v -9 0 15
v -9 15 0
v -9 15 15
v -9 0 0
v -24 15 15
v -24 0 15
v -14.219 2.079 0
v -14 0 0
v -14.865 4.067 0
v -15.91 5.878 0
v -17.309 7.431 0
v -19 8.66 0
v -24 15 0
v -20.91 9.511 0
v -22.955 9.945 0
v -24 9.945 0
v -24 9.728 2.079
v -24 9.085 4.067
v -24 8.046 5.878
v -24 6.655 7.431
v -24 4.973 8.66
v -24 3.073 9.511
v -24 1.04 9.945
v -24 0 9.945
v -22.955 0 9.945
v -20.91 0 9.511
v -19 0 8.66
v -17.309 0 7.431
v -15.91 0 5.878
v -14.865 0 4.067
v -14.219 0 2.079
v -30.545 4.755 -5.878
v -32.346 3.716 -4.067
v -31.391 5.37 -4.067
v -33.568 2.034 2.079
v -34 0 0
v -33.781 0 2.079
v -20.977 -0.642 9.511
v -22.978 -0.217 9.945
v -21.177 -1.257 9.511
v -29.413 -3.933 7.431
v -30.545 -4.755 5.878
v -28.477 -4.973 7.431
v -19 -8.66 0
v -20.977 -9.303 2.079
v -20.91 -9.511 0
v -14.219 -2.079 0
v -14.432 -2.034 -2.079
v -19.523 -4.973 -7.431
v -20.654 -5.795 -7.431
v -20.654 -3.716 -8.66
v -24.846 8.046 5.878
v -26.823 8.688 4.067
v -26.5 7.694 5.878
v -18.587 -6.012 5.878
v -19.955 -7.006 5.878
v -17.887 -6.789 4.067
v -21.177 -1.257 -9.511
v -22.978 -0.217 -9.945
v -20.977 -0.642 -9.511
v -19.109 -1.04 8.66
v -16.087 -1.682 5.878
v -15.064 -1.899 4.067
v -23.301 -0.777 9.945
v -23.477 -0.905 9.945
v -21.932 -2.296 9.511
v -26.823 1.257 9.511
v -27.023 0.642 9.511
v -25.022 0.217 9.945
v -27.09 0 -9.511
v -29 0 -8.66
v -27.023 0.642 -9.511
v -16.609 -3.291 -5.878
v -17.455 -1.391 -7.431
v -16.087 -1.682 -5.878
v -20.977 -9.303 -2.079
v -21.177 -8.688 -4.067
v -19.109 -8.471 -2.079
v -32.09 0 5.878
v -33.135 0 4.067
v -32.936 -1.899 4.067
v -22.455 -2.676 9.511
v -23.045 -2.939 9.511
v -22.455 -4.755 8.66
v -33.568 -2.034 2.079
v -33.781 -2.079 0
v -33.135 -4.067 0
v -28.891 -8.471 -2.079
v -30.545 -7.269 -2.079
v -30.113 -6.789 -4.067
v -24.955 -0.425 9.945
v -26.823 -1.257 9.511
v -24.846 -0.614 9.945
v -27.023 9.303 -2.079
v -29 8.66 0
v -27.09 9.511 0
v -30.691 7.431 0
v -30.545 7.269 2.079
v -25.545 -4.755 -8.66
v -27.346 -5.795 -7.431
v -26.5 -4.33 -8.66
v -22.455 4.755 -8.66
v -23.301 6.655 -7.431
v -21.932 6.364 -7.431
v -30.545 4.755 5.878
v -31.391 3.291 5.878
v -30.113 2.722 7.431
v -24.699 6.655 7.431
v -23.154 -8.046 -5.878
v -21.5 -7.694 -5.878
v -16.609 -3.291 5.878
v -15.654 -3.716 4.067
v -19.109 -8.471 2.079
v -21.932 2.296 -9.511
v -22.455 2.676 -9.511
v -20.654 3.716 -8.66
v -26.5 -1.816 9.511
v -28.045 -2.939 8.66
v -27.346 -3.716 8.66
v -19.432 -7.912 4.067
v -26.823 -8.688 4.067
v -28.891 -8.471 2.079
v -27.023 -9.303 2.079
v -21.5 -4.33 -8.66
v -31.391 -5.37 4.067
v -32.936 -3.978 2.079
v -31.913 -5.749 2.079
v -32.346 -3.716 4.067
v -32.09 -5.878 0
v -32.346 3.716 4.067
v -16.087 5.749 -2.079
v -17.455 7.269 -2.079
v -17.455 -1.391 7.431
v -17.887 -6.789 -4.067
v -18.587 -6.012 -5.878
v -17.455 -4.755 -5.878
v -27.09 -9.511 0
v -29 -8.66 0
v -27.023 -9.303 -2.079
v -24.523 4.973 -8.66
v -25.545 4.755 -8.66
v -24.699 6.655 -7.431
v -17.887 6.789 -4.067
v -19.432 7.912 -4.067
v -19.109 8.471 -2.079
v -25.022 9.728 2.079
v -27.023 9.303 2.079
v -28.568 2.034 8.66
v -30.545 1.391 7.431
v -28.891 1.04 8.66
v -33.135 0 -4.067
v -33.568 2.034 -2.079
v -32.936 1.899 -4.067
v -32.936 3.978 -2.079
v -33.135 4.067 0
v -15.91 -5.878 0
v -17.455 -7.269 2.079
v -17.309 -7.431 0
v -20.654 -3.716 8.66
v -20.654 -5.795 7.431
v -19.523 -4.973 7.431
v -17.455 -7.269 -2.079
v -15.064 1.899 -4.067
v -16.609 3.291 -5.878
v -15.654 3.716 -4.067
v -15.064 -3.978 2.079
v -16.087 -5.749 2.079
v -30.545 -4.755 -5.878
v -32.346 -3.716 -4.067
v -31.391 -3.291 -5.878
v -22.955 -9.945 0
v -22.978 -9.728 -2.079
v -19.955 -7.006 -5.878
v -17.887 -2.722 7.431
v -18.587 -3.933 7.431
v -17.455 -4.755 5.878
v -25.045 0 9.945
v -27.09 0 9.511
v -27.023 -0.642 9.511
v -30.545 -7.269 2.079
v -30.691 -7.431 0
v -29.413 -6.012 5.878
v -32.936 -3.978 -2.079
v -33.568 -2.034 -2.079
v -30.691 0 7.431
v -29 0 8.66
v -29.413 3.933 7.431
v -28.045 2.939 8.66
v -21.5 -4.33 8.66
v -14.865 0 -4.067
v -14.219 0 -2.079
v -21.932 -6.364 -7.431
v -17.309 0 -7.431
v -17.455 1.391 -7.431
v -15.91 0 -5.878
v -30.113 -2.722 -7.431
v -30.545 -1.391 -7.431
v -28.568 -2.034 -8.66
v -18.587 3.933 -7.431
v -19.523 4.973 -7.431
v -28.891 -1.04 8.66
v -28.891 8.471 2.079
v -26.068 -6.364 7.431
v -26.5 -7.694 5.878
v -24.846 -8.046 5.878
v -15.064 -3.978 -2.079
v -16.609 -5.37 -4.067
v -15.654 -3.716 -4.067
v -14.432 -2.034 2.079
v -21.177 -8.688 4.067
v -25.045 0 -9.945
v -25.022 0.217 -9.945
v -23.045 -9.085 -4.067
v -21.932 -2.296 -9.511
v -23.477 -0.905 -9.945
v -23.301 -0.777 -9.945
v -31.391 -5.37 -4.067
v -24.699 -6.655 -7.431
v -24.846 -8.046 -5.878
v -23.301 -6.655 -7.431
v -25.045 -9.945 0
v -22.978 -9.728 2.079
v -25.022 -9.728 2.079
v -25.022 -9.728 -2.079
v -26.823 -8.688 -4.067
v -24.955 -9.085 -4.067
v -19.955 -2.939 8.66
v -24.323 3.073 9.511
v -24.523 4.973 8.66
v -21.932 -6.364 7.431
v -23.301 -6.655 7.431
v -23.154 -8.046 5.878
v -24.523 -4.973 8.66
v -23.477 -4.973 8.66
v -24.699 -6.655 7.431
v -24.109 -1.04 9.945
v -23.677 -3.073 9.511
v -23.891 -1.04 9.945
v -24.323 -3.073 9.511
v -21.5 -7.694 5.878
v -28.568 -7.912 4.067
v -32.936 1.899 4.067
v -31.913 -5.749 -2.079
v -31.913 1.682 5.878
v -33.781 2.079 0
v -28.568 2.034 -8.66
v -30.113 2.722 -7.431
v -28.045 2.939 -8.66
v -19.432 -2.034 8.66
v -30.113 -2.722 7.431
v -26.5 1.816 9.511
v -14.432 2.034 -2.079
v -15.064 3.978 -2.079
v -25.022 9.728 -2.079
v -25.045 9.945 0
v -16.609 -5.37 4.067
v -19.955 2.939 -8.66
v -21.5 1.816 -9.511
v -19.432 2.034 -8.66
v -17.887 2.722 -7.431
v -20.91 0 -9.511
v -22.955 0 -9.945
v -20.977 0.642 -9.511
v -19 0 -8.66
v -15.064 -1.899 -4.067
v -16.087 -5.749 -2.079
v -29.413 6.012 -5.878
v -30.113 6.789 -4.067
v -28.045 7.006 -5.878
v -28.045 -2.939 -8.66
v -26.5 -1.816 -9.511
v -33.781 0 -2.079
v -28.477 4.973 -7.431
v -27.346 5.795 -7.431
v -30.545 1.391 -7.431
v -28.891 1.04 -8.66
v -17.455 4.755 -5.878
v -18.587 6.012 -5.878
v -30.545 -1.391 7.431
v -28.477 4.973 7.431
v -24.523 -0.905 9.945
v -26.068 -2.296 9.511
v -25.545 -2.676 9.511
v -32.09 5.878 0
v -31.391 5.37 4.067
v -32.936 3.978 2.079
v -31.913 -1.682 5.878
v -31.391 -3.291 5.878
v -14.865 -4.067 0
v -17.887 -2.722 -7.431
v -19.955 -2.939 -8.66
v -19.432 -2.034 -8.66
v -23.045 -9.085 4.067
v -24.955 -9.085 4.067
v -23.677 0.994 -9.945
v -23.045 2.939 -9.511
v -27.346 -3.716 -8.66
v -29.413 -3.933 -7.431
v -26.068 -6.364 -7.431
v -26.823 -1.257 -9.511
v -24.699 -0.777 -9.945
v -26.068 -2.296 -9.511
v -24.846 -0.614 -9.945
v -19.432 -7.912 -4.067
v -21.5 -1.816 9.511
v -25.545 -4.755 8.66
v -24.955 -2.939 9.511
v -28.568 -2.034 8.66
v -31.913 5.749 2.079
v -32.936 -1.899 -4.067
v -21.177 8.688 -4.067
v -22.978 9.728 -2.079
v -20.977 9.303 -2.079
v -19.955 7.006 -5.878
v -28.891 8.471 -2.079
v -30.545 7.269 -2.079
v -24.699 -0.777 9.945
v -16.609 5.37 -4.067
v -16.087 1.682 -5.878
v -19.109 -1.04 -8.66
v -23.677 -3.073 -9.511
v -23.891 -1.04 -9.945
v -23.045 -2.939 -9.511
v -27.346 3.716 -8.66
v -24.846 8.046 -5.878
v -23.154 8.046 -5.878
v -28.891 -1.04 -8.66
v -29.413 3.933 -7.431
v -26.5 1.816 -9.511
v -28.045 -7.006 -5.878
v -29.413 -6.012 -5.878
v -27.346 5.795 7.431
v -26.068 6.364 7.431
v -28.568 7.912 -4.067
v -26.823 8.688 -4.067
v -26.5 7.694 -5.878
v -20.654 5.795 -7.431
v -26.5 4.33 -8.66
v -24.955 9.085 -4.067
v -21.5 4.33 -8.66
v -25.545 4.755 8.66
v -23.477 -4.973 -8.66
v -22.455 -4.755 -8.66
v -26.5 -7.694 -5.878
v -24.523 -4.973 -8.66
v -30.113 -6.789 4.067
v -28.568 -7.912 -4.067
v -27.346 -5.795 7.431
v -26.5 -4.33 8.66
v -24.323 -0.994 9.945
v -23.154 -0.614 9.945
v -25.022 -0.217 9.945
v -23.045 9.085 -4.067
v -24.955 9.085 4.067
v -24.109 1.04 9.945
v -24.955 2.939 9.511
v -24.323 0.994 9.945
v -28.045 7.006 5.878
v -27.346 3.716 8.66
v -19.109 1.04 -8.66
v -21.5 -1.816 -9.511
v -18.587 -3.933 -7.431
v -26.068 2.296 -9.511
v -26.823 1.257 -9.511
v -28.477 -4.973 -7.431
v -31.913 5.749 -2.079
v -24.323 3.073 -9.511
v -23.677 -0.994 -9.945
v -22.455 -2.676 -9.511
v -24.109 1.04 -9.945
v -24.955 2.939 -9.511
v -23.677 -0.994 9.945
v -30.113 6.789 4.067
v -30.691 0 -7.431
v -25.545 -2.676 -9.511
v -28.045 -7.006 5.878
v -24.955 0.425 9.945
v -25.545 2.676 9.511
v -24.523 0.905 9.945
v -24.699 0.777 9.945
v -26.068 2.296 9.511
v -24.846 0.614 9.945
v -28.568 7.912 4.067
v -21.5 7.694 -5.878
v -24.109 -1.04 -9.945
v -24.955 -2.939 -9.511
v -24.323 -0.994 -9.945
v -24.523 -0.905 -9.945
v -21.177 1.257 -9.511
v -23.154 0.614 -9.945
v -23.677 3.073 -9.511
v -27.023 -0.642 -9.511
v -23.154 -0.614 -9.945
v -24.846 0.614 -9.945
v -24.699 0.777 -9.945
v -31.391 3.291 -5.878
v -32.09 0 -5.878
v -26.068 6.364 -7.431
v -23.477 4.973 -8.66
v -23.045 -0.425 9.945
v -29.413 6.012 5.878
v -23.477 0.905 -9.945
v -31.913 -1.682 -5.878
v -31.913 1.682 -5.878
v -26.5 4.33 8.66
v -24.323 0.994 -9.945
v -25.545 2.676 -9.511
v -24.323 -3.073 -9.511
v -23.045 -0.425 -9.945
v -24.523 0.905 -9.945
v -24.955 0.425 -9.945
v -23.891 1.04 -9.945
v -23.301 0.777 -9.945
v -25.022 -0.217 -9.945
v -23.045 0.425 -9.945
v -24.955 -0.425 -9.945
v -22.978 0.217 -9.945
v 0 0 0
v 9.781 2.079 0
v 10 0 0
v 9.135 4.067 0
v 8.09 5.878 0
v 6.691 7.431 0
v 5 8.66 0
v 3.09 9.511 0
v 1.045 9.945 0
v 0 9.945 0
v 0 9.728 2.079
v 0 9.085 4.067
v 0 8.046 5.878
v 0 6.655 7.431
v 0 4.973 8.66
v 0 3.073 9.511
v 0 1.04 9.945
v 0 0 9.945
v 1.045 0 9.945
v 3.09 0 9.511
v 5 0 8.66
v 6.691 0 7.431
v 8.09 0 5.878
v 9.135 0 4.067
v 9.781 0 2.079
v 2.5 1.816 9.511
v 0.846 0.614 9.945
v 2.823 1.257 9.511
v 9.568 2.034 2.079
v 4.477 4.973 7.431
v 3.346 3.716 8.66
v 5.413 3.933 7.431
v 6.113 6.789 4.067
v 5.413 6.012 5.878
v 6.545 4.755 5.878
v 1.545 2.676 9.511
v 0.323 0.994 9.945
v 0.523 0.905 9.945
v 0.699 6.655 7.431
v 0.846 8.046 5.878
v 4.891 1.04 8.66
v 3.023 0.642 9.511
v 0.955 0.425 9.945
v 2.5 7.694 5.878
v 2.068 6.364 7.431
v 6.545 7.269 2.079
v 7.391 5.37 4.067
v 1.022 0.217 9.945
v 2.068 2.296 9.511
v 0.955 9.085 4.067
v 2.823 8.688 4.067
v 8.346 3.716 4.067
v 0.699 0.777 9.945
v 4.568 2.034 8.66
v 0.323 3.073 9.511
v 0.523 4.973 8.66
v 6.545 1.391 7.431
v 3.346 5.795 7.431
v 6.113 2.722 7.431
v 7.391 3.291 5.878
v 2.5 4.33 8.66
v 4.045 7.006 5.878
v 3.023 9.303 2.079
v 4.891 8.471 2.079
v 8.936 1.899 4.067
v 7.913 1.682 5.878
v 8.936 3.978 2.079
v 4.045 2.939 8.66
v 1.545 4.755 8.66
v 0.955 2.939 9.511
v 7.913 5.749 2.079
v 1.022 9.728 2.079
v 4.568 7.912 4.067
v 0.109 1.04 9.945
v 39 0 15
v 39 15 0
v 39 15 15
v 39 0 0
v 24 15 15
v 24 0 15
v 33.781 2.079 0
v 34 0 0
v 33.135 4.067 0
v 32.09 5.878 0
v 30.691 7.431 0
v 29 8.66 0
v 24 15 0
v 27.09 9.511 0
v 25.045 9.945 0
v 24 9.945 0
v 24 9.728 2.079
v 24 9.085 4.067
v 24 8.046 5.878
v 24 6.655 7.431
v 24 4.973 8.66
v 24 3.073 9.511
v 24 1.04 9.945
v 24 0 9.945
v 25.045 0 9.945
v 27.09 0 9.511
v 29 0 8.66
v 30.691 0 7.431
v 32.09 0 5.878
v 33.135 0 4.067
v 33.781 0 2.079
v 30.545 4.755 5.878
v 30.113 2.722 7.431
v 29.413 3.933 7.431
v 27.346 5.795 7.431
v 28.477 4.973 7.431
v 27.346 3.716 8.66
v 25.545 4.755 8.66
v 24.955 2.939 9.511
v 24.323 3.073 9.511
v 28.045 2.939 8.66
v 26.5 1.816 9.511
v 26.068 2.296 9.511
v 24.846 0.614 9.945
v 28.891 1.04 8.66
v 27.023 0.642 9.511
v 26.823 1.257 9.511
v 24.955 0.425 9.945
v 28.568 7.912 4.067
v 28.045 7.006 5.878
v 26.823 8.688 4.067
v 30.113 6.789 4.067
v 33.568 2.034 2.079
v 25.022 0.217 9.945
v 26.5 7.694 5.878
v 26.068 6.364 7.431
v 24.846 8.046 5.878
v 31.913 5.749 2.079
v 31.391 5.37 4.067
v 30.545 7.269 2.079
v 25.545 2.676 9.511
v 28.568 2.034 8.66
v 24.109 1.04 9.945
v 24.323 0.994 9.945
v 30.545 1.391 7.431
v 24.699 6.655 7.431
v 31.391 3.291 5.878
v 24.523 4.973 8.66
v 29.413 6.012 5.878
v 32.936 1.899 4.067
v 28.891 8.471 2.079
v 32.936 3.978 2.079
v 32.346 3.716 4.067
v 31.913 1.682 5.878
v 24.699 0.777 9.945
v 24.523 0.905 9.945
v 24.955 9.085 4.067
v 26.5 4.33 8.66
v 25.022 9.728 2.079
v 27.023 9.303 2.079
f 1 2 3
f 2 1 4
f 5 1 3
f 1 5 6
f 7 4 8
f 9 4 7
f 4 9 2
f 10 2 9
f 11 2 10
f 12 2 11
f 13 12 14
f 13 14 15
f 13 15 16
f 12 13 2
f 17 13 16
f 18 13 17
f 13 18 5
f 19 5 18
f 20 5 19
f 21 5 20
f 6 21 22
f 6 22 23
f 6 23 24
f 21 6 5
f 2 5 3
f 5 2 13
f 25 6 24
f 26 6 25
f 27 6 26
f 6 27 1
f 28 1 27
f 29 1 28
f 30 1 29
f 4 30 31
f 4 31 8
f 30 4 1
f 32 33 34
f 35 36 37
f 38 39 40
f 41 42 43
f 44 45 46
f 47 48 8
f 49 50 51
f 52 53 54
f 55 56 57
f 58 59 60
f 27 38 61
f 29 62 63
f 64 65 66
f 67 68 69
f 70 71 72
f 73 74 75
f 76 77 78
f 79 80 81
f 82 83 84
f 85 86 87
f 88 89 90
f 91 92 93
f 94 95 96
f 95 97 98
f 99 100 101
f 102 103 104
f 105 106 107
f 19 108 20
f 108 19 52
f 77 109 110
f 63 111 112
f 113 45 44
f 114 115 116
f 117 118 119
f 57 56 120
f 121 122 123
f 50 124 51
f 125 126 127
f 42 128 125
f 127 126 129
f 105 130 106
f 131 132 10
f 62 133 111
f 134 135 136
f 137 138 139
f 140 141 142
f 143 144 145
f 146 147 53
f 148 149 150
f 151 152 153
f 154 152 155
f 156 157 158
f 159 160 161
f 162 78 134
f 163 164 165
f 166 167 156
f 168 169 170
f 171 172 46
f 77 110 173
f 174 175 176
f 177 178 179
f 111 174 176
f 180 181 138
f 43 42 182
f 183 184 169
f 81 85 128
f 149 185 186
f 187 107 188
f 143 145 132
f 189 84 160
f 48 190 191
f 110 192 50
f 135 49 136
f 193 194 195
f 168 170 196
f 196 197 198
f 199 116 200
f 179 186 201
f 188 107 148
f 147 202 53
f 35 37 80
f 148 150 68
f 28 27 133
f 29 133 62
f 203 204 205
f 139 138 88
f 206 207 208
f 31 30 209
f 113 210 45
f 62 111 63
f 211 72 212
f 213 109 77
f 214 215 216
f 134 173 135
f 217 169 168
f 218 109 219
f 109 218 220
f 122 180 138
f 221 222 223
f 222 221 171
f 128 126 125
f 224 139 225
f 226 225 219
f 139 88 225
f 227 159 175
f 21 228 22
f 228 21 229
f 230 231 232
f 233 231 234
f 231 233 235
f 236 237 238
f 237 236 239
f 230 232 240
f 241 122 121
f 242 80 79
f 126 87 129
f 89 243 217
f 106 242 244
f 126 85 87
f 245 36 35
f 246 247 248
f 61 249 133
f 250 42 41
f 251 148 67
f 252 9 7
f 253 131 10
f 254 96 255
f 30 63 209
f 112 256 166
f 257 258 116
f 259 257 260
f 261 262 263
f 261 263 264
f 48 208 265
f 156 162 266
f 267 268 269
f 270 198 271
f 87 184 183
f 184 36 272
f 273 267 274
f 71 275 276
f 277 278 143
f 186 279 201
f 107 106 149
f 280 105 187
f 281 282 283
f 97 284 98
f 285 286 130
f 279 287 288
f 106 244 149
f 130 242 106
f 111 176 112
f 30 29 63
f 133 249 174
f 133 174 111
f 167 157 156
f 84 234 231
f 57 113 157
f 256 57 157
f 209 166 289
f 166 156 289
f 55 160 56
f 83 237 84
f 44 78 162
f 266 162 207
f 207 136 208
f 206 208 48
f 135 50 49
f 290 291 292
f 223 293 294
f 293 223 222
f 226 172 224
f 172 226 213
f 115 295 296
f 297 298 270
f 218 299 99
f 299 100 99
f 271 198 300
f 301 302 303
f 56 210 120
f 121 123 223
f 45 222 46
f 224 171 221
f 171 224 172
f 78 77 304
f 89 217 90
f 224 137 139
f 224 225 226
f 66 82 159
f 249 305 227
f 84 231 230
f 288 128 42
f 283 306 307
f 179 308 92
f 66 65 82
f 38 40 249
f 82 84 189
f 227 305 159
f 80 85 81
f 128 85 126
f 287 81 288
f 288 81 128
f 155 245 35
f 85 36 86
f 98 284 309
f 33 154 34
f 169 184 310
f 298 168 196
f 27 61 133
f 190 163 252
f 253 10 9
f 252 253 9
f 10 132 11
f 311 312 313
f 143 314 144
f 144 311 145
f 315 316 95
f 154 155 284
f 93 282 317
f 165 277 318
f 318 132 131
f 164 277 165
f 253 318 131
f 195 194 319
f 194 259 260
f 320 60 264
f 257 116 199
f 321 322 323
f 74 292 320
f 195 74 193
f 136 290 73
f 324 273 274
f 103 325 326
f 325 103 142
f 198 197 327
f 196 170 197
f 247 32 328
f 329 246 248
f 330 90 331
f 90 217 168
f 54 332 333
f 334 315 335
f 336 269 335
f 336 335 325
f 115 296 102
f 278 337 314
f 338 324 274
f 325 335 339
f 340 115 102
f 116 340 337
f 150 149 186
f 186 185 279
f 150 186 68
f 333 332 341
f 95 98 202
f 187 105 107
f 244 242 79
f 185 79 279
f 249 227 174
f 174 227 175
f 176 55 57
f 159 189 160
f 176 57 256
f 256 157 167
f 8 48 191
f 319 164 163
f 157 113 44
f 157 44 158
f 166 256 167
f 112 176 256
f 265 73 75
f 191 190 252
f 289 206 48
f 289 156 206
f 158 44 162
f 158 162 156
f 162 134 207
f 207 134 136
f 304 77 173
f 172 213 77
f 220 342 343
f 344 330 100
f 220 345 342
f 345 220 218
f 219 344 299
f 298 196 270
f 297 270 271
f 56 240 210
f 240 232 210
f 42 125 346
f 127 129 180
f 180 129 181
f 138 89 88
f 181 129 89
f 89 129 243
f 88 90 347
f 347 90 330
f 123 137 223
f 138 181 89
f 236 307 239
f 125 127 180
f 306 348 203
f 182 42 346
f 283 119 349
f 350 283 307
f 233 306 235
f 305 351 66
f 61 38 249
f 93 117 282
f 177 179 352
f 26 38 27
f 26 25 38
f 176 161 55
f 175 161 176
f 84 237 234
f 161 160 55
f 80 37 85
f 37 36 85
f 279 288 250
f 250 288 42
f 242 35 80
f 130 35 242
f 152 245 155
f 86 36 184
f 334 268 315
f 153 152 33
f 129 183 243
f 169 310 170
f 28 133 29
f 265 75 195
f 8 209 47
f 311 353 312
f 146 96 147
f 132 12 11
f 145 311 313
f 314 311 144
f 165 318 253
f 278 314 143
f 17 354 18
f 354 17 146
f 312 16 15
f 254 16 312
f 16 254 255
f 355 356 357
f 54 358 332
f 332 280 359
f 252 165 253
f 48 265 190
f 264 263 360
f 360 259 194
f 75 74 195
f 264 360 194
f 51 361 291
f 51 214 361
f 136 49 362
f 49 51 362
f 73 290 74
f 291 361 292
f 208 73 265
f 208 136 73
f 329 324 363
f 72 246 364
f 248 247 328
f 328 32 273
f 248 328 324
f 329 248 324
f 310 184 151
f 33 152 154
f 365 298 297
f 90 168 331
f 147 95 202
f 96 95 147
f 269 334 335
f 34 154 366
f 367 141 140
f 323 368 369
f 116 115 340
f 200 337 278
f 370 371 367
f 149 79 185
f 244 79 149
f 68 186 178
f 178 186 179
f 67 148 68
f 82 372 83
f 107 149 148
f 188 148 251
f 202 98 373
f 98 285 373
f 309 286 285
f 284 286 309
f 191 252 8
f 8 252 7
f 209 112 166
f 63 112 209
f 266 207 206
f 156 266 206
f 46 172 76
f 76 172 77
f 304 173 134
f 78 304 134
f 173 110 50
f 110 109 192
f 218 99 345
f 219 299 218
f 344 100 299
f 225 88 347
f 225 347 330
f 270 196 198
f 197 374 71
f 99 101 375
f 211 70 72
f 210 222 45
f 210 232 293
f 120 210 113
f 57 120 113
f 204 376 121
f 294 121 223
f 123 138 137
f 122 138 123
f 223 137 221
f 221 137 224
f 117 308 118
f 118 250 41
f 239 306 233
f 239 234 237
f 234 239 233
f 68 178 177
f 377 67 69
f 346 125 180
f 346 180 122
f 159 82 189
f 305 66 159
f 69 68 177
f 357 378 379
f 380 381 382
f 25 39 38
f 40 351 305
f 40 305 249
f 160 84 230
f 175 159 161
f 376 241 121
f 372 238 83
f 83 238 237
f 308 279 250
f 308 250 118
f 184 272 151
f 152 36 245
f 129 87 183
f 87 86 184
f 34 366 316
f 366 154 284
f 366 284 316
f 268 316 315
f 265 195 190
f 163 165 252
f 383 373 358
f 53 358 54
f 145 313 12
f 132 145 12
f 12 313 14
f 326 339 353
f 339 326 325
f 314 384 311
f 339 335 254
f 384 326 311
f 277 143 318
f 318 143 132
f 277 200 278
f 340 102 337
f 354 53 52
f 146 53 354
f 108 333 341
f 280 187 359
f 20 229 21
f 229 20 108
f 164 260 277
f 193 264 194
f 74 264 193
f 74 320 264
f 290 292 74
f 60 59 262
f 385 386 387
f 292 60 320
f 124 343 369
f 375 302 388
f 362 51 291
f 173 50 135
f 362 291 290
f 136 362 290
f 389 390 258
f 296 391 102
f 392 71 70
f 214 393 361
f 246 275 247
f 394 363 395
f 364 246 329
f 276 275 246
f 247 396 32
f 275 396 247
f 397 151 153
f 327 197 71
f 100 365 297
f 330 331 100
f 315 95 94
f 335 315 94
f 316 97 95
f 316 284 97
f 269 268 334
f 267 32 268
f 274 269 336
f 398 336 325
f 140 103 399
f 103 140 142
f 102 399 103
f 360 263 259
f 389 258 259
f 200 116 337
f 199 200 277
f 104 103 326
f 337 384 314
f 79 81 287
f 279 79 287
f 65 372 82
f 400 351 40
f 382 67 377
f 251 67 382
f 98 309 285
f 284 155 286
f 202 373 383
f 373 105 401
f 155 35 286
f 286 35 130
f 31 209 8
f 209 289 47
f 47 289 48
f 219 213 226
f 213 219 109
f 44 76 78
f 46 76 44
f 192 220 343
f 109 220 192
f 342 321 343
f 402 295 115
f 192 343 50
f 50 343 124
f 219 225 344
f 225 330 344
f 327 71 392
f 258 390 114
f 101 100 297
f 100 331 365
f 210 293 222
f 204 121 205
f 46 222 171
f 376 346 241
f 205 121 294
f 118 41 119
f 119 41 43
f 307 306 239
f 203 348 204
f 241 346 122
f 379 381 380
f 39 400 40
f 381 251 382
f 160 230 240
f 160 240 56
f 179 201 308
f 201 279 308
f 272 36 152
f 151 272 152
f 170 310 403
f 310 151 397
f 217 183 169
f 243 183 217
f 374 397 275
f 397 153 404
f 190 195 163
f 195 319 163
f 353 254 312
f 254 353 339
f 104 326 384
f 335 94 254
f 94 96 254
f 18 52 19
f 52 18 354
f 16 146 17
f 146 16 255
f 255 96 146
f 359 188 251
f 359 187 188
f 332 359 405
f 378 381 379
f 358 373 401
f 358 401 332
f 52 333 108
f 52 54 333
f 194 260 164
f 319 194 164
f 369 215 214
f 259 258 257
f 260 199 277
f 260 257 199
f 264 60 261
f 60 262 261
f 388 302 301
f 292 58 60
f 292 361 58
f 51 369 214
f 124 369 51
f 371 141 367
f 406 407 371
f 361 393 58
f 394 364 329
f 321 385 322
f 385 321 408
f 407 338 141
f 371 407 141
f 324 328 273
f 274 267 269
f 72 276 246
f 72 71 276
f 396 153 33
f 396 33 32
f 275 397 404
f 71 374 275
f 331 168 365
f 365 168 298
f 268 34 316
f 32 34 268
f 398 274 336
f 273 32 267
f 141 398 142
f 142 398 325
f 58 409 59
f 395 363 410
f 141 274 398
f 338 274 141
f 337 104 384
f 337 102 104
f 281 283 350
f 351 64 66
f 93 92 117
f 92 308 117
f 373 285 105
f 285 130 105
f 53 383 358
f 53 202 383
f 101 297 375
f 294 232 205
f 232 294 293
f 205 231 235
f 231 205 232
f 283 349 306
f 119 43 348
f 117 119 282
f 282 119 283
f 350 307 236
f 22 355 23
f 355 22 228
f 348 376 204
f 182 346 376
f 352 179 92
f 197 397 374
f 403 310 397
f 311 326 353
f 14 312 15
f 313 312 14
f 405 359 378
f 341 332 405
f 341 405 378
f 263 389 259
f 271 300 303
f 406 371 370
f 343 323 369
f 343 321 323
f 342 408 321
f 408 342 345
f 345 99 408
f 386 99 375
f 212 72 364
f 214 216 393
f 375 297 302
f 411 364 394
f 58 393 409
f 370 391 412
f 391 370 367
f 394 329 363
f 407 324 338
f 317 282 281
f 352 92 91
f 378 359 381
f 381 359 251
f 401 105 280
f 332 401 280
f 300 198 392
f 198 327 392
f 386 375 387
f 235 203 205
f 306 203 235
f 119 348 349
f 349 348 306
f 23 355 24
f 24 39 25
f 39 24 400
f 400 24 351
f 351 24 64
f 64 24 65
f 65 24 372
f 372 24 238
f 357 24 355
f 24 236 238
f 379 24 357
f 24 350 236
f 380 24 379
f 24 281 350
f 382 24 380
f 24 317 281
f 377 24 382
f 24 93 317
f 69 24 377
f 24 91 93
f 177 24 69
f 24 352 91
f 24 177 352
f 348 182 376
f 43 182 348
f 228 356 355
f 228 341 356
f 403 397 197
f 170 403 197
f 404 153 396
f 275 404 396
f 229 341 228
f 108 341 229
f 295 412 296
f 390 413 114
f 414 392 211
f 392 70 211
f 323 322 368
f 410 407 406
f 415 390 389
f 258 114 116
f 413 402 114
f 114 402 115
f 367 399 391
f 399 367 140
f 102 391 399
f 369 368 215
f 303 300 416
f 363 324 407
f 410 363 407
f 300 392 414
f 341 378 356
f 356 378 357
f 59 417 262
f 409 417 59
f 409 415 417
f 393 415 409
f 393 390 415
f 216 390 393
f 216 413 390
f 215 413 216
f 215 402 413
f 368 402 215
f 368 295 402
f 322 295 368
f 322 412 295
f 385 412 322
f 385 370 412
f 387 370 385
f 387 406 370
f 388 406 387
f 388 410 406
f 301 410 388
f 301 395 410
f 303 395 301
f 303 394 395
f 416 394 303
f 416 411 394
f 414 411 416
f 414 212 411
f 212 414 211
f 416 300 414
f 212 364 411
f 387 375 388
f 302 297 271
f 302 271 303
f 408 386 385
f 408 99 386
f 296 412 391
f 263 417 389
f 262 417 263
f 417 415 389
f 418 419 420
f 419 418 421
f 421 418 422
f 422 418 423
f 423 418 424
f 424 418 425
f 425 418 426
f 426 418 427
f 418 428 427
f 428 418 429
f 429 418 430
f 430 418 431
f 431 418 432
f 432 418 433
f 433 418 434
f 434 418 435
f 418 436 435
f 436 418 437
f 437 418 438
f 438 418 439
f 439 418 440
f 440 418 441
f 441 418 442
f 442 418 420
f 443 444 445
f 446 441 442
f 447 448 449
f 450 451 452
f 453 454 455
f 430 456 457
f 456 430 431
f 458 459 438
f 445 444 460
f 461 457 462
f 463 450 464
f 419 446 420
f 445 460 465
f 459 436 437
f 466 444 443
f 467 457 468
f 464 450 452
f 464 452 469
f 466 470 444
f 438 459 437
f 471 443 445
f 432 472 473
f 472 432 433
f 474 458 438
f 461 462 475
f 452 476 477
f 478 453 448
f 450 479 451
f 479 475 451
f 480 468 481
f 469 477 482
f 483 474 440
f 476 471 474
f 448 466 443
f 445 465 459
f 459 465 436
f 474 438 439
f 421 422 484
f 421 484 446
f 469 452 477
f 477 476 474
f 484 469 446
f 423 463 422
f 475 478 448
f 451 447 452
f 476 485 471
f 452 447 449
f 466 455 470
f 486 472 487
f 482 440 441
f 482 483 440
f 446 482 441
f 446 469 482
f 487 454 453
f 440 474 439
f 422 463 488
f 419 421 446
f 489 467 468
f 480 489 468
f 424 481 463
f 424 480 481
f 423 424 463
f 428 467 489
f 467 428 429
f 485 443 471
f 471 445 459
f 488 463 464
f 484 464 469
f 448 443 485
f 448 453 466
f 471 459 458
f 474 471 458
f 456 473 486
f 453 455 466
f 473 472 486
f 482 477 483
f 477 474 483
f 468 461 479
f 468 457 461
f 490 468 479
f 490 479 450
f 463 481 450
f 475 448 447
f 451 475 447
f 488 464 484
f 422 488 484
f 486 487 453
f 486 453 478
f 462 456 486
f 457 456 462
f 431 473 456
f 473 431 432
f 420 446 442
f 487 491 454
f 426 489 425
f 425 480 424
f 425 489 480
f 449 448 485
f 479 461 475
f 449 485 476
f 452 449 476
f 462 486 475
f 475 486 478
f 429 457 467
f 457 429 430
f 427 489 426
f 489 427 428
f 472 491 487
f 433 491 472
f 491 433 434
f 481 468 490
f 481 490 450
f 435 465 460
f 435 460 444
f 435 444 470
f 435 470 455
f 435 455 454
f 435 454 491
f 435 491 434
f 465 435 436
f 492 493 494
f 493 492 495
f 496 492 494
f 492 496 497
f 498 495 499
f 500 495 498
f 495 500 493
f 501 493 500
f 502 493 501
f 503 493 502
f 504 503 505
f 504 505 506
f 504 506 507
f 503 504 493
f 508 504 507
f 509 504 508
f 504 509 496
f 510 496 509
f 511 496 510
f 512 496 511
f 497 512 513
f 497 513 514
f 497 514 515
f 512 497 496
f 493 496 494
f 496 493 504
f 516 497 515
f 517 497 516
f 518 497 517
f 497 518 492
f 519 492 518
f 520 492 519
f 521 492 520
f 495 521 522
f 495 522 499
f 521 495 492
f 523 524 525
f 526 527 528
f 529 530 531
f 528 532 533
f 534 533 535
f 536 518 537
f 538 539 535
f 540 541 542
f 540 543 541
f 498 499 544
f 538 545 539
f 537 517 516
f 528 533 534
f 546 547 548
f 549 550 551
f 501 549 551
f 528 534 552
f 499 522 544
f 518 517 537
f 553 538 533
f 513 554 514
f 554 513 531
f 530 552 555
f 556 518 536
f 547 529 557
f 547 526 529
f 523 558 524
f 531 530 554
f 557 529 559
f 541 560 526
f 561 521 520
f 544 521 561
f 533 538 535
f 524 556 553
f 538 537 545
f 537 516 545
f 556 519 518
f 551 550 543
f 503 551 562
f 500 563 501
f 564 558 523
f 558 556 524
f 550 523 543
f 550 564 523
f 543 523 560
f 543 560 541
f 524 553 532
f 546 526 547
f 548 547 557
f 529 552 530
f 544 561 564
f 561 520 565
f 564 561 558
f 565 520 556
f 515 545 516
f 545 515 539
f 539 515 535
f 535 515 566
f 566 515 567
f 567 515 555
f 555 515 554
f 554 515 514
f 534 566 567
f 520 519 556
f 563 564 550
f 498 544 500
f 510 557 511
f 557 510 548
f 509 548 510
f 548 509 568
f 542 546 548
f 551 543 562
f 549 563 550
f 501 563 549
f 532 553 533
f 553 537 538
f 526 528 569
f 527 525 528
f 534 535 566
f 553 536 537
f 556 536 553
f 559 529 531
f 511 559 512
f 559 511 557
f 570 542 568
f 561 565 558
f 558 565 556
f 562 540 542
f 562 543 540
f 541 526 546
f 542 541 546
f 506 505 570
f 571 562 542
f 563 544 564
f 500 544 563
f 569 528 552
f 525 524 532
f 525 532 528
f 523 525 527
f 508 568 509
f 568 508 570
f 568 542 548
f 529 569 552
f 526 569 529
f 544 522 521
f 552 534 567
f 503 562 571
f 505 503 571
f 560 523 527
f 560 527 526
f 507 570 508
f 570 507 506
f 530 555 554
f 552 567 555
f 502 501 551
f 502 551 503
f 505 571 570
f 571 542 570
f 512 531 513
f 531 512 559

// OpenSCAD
union(){
translate([-24,0,0]) {
    union() {
        cube(15);
        sphere(10);
    }
}

intersection() {
    cube(15);
    sphere(10);
}

translate([24,0,0]) {
    difference() {
        cube(15);
        sphere(10);
    }
}	
}
